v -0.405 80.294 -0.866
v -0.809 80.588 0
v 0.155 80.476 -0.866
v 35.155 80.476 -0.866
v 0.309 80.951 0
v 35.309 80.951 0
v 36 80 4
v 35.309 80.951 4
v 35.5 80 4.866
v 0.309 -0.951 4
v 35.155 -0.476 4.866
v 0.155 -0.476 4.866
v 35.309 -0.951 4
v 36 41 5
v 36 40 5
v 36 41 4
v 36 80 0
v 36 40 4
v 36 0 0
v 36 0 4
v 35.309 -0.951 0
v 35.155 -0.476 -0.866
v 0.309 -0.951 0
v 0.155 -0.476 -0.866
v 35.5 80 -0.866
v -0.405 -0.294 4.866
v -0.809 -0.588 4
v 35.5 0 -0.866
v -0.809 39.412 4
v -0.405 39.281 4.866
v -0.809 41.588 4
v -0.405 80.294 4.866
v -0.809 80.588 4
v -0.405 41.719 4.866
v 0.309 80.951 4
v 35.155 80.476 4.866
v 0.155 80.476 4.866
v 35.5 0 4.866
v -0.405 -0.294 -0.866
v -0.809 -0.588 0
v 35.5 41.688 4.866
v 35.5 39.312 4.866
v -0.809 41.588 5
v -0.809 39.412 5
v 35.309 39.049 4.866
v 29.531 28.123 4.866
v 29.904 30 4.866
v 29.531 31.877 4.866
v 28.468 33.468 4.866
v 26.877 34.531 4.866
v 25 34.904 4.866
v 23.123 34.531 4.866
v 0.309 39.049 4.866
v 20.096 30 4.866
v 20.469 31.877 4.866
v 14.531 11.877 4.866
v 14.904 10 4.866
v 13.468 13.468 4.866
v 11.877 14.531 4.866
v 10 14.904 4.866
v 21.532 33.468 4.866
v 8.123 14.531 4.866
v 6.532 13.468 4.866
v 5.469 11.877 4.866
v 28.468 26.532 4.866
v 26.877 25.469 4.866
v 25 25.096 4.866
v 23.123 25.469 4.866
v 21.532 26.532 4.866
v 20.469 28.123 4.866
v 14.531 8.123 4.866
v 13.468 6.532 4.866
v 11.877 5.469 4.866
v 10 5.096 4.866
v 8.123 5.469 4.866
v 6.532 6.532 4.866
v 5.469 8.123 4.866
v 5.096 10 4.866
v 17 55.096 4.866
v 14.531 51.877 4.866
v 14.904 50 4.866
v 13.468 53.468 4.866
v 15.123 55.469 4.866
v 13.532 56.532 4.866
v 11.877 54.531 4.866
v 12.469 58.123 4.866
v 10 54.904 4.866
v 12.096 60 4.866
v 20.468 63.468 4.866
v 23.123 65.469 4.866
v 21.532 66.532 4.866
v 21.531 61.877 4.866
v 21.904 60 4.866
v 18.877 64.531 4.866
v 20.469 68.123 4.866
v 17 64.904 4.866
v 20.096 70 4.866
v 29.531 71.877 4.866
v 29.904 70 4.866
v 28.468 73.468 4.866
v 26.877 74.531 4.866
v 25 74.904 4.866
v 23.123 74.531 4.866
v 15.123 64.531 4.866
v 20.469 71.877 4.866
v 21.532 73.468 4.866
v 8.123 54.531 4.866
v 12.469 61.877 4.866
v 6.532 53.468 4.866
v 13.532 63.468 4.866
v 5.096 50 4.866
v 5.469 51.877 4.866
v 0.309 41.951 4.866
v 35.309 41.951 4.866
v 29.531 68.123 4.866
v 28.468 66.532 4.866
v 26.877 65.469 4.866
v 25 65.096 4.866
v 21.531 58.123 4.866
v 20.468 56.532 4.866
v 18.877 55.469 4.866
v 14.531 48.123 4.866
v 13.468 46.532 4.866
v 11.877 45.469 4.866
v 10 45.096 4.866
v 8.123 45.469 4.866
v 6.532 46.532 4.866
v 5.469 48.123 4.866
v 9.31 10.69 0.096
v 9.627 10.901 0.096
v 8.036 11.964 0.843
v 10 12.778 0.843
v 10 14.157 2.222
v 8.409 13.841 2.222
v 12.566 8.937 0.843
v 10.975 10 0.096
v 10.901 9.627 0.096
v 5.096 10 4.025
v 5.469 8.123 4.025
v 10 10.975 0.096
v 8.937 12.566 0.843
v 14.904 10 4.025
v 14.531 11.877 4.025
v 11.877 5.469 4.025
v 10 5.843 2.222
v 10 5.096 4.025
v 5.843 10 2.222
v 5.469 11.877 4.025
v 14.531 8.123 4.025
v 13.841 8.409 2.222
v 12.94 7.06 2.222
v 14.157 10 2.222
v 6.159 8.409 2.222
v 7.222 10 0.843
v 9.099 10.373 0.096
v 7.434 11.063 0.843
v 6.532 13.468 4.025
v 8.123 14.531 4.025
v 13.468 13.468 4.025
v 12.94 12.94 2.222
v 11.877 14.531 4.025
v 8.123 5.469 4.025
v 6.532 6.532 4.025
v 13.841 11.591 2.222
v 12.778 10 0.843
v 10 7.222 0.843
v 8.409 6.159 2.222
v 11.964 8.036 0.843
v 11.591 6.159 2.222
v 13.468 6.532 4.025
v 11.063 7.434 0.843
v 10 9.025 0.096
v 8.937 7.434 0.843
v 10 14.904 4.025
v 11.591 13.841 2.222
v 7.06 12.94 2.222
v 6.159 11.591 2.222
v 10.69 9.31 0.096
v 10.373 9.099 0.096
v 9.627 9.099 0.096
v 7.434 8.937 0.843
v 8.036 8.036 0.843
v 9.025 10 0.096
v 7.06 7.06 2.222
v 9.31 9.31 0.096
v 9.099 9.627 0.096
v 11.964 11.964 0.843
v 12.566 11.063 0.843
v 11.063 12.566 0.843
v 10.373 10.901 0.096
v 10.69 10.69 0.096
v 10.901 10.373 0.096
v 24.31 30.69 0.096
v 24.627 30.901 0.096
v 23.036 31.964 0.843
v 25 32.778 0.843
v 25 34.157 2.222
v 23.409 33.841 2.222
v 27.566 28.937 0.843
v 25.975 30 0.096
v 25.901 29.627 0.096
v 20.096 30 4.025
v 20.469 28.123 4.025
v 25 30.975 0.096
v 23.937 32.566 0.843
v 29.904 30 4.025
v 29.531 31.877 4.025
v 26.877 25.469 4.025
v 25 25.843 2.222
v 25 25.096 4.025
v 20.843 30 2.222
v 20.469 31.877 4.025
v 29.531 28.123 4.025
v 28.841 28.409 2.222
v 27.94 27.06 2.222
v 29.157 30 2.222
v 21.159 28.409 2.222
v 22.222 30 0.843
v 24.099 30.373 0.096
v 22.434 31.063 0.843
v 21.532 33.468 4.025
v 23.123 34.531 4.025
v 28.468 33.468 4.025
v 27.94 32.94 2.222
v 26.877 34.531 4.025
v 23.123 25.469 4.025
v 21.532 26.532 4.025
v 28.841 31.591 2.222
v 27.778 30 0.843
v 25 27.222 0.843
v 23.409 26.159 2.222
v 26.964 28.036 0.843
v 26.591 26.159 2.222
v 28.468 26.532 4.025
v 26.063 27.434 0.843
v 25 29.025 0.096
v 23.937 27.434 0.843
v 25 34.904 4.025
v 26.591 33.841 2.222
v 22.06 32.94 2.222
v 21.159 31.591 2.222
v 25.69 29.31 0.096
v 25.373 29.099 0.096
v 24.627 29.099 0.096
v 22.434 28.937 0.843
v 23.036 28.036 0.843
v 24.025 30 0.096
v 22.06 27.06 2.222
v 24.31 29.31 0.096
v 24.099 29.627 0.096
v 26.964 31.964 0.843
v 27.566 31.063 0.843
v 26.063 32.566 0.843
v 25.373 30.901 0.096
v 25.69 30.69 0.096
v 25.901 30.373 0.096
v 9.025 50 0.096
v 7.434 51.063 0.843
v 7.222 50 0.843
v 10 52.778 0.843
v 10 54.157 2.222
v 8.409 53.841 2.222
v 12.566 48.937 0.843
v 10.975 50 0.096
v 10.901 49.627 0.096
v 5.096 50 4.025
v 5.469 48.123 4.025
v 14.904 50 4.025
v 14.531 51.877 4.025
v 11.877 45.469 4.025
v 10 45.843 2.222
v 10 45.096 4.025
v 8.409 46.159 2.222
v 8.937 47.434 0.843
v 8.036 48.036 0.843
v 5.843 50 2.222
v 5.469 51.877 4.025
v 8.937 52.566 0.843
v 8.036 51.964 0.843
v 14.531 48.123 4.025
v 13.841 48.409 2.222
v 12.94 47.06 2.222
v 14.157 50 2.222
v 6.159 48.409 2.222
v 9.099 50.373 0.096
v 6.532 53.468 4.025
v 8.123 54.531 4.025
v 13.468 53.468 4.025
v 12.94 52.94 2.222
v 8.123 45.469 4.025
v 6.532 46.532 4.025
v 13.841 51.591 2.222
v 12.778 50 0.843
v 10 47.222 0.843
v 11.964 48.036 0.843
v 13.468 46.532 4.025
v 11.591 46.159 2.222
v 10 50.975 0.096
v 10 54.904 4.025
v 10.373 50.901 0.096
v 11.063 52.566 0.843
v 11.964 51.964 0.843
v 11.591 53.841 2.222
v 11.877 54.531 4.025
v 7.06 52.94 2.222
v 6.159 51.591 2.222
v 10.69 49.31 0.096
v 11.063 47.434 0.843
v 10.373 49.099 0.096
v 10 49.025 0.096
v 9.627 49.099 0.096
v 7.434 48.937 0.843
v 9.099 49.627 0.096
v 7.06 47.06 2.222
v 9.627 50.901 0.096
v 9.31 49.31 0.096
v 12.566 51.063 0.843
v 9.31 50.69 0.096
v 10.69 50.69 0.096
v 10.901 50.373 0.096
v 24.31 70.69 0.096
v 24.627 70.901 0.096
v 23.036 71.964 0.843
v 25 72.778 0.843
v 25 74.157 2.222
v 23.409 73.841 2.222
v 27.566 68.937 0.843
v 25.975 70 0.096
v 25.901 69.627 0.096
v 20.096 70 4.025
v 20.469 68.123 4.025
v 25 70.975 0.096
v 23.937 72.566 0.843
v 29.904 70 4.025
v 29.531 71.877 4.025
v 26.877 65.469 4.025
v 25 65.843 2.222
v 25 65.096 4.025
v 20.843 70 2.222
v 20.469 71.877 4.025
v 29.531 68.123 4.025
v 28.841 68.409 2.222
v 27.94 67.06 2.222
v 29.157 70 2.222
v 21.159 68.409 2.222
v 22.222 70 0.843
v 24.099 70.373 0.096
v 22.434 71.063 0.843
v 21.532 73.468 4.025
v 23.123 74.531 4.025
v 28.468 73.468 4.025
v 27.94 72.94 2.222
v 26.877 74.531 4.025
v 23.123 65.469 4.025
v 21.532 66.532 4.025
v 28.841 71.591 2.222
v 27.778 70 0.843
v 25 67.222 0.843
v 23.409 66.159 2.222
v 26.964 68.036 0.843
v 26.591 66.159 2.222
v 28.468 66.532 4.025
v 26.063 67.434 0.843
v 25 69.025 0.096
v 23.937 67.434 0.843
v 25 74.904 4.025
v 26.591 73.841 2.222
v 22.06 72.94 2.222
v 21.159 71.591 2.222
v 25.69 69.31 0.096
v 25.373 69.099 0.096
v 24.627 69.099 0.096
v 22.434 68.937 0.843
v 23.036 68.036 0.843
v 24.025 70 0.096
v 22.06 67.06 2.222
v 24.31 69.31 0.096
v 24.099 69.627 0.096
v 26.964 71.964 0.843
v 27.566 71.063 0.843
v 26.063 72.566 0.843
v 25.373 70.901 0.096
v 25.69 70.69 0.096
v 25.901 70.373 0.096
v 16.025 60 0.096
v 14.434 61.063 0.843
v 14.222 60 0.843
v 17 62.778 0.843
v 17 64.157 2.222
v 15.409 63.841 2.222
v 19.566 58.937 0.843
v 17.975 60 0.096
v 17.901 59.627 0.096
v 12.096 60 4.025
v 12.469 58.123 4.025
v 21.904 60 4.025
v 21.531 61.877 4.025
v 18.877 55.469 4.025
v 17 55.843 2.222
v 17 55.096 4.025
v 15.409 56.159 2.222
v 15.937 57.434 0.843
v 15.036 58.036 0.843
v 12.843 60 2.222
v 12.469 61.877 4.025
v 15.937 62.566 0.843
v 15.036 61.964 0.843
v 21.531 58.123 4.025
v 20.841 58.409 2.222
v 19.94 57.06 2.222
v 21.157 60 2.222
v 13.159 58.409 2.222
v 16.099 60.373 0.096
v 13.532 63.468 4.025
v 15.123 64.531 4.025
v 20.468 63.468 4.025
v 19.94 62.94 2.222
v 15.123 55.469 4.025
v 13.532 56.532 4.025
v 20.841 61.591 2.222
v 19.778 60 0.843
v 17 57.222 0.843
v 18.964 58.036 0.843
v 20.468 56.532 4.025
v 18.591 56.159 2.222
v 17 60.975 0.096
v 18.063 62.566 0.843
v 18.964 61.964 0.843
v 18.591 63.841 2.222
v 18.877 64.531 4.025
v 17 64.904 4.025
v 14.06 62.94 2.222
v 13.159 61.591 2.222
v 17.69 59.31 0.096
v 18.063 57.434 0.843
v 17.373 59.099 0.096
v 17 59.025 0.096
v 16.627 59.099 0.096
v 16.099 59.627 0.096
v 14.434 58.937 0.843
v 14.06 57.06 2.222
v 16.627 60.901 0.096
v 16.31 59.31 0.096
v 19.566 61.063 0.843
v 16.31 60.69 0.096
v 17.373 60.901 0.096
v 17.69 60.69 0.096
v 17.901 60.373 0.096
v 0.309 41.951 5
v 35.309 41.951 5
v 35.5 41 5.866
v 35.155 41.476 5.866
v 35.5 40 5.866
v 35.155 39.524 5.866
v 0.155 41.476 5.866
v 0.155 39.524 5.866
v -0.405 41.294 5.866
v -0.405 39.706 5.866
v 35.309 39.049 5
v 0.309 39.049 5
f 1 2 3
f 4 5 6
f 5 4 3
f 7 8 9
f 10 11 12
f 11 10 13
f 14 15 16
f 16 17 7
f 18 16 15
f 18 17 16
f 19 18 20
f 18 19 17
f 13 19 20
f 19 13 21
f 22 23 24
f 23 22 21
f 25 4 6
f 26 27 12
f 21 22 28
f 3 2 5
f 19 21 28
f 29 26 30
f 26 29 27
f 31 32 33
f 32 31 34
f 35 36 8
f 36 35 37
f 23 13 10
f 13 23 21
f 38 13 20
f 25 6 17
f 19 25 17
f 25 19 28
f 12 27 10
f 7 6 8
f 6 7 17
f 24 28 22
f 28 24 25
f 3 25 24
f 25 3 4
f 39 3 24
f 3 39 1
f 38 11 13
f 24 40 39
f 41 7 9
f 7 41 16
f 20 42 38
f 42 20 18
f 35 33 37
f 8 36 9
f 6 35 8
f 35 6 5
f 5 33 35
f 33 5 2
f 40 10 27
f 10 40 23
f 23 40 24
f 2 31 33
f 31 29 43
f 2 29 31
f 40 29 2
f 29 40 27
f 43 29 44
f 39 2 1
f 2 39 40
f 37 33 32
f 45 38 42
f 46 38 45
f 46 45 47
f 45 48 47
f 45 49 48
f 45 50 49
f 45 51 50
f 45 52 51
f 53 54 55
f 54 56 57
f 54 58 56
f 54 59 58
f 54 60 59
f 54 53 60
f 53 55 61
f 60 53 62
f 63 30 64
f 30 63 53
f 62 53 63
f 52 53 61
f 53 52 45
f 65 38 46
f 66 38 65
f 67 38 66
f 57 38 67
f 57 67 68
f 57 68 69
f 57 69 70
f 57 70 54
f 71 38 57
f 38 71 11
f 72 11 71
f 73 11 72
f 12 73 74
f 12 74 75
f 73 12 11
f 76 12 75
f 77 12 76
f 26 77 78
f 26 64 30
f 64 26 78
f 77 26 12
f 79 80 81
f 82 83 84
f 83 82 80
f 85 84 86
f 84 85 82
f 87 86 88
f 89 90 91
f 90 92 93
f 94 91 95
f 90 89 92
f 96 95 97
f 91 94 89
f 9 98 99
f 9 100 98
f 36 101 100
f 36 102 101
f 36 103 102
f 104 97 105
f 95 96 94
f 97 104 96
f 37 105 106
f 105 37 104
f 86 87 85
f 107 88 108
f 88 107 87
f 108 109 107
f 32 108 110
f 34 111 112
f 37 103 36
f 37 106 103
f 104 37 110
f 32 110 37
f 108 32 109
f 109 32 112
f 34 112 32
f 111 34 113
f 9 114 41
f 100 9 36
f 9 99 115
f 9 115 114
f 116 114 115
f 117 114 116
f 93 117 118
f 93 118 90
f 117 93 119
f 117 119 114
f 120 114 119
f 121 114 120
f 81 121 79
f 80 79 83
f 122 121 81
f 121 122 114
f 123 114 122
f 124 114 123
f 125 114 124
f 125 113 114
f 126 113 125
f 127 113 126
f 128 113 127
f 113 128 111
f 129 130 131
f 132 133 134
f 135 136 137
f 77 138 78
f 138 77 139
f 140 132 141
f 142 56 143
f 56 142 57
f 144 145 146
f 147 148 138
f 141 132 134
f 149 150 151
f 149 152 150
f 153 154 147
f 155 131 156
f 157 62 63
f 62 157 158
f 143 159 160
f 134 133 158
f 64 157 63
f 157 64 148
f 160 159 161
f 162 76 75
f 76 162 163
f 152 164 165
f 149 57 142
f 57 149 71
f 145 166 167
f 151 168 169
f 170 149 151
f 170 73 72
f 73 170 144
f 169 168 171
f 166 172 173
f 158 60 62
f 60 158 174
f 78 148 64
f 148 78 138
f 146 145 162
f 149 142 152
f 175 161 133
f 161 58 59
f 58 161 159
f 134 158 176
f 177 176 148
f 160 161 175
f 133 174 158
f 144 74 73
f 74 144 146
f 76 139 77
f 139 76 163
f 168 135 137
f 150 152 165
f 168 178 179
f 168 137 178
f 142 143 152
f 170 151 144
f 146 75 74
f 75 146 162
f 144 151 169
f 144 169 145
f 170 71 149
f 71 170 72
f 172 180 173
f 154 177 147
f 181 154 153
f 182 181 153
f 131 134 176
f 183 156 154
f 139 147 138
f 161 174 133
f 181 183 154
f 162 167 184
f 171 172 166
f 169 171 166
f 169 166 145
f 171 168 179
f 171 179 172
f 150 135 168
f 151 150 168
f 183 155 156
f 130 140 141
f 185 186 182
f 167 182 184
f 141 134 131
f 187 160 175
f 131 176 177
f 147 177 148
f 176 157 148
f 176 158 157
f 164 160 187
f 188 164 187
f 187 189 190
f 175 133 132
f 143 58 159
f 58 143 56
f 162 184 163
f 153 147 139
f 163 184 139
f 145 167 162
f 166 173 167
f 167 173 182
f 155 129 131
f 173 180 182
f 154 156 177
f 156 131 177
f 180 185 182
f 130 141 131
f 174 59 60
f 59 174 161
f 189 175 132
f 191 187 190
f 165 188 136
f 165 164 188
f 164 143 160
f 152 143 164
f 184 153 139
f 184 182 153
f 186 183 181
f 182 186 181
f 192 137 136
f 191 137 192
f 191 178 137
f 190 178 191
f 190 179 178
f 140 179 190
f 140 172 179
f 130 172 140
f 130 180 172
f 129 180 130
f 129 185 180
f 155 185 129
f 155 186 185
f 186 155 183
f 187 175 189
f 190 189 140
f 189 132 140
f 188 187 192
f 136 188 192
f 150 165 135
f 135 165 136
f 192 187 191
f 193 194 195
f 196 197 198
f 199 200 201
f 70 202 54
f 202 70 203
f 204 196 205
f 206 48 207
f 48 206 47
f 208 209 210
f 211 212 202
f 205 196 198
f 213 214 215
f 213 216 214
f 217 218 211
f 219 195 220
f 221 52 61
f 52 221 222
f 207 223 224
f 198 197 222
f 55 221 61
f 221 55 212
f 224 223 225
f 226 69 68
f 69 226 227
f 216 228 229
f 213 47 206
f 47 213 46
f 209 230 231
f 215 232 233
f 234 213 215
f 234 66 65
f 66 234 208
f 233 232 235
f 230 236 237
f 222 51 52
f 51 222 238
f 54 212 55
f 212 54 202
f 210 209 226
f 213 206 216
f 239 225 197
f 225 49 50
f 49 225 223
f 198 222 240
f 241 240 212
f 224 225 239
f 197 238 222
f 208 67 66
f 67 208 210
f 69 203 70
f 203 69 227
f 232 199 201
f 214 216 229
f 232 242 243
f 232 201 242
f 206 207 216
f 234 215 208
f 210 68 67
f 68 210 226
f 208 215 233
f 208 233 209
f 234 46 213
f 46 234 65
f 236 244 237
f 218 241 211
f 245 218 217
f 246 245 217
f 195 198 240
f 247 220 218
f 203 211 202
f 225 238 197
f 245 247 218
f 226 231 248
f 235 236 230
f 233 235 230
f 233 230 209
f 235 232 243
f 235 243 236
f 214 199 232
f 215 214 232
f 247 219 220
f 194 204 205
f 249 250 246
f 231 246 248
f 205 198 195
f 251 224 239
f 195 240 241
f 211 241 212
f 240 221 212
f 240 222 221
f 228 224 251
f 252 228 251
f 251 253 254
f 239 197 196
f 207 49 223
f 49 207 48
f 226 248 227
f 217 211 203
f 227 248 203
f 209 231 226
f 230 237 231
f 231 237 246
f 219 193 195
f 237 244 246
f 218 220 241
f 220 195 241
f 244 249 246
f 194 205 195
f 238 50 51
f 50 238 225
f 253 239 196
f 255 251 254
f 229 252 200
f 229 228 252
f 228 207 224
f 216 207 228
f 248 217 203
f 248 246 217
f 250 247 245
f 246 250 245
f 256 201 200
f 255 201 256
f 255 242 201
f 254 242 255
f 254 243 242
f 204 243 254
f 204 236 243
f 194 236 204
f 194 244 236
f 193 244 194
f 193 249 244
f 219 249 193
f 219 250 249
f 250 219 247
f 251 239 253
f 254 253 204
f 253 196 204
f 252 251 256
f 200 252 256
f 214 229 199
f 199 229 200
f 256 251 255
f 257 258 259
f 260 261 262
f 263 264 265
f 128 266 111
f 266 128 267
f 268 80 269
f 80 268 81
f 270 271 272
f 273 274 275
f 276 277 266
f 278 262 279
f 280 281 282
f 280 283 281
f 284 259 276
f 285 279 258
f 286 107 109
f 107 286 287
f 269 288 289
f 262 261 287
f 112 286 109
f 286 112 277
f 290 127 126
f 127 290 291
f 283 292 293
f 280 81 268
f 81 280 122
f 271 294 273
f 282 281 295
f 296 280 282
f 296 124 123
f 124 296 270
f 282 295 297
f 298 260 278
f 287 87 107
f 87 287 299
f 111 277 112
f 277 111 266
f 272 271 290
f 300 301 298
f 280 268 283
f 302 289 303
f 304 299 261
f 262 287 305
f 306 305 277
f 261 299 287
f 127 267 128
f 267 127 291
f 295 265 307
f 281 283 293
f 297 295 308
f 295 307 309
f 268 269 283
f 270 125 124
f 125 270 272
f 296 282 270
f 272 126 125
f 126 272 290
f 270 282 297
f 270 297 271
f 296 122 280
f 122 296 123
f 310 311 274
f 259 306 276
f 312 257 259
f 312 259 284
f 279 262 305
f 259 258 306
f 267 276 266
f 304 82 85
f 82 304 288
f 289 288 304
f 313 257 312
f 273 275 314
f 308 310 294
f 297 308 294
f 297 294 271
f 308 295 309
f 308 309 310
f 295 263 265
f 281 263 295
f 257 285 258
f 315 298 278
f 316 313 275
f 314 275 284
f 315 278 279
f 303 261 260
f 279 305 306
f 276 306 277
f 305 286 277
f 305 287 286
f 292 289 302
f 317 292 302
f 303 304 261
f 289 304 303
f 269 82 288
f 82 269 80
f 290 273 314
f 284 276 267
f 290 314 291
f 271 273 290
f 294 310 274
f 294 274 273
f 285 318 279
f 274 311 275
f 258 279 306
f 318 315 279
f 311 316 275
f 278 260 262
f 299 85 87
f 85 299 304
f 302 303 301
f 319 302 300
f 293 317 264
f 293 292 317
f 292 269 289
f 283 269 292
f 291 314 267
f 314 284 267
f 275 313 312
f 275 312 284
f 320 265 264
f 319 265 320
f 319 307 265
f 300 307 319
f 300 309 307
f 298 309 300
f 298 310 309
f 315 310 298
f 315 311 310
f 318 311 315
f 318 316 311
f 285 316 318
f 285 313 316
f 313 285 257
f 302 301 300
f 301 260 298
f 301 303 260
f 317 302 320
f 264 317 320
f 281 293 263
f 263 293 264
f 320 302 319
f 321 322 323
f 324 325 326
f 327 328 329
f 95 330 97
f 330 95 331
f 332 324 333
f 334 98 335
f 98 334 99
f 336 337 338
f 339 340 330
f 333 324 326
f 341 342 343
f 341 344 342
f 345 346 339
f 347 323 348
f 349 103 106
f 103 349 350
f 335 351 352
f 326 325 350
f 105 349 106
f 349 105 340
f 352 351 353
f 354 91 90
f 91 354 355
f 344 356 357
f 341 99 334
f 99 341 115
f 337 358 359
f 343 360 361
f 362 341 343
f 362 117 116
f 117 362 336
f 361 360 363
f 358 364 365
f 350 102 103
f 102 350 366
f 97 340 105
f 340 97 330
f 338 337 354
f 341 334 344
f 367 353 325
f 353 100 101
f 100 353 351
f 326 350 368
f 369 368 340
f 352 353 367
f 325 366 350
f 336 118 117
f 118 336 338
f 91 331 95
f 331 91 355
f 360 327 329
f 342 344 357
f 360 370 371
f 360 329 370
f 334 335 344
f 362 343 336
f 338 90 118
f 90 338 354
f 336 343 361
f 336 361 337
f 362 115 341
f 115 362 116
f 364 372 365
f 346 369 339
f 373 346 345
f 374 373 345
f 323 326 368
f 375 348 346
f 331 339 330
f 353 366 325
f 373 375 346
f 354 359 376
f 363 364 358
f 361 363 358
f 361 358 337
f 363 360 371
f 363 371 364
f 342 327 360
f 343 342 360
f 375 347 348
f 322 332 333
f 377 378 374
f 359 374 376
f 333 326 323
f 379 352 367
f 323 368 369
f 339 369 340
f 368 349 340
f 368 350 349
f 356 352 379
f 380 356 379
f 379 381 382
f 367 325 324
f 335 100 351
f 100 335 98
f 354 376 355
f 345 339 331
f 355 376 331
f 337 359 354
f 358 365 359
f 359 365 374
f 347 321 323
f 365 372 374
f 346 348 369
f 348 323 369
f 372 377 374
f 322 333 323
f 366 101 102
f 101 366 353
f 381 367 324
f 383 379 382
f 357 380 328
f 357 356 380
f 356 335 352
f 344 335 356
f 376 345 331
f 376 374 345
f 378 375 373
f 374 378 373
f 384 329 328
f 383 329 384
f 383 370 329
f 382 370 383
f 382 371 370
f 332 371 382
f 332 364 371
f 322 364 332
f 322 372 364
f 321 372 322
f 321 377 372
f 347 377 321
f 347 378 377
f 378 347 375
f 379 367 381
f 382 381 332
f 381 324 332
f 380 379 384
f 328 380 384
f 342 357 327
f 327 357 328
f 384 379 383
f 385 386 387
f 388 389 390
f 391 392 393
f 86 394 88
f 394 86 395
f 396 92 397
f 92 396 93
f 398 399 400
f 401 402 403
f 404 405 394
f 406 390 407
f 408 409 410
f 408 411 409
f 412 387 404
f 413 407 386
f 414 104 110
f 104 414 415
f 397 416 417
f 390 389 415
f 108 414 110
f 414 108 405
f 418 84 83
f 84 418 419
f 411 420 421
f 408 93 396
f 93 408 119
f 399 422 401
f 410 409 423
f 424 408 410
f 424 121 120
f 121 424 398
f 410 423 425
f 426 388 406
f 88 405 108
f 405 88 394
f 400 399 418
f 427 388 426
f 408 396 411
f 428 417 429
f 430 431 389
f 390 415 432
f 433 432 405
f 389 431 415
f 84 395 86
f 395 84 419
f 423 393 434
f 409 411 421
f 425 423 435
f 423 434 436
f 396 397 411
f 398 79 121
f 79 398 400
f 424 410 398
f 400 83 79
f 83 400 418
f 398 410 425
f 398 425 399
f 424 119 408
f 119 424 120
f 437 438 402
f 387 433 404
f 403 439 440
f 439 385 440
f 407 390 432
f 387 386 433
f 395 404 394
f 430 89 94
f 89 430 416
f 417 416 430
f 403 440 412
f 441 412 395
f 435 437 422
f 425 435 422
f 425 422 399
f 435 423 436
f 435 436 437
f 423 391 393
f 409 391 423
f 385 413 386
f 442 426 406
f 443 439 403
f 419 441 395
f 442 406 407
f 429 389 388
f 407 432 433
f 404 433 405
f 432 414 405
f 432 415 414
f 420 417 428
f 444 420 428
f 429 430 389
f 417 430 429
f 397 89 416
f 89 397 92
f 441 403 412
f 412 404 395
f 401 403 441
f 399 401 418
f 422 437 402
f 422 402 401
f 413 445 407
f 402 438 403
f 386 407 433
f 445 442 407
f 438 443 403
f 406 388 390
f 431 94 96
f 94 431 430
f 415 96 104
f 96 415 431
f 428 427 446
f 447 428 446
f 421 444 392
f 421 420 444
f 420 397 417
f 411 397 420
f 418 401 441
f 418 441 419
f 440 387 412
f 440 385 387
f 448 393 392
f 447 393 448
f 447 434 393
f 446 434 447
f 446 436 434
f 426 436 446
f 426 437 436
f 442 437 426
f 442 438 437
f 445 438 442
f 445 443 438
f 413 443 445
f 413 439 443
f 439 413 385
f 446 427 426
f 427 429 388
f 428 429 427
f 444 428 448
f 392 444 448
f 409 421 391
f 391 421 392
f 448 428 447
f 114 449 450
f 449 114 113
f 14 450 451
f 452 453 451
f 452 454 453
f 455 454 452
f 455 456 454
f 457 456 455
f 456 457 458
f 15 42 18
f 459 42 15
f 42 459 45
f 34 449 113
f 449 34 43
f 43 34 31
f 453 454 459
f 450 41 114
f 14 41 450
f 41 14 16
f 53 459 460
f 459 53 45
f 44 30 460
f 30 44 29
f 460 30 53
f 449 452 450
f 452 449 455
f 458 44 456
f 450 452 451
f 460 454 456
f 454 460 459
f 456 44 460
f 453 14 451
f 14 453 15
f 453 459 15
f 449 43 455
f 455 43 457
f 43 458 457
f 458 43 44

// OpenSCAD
// Loguncov Maxim 13.12.13


//$fn=128;


translate([0,40,0])
minkowski()
{cube([35,1,5]);
sphere(1);
}

difference() {

//основа
minkowski()
{cube([35,80,4]);
sphere(1);
}

//отверстия
translate([10,10,5])sphere(5);
translate([25,30,5])sphere(5);


translate([10,50,5])sphere(5);
translate([25,70,5])sphere(5);
translate([17,60,5])sphere(5);

}
